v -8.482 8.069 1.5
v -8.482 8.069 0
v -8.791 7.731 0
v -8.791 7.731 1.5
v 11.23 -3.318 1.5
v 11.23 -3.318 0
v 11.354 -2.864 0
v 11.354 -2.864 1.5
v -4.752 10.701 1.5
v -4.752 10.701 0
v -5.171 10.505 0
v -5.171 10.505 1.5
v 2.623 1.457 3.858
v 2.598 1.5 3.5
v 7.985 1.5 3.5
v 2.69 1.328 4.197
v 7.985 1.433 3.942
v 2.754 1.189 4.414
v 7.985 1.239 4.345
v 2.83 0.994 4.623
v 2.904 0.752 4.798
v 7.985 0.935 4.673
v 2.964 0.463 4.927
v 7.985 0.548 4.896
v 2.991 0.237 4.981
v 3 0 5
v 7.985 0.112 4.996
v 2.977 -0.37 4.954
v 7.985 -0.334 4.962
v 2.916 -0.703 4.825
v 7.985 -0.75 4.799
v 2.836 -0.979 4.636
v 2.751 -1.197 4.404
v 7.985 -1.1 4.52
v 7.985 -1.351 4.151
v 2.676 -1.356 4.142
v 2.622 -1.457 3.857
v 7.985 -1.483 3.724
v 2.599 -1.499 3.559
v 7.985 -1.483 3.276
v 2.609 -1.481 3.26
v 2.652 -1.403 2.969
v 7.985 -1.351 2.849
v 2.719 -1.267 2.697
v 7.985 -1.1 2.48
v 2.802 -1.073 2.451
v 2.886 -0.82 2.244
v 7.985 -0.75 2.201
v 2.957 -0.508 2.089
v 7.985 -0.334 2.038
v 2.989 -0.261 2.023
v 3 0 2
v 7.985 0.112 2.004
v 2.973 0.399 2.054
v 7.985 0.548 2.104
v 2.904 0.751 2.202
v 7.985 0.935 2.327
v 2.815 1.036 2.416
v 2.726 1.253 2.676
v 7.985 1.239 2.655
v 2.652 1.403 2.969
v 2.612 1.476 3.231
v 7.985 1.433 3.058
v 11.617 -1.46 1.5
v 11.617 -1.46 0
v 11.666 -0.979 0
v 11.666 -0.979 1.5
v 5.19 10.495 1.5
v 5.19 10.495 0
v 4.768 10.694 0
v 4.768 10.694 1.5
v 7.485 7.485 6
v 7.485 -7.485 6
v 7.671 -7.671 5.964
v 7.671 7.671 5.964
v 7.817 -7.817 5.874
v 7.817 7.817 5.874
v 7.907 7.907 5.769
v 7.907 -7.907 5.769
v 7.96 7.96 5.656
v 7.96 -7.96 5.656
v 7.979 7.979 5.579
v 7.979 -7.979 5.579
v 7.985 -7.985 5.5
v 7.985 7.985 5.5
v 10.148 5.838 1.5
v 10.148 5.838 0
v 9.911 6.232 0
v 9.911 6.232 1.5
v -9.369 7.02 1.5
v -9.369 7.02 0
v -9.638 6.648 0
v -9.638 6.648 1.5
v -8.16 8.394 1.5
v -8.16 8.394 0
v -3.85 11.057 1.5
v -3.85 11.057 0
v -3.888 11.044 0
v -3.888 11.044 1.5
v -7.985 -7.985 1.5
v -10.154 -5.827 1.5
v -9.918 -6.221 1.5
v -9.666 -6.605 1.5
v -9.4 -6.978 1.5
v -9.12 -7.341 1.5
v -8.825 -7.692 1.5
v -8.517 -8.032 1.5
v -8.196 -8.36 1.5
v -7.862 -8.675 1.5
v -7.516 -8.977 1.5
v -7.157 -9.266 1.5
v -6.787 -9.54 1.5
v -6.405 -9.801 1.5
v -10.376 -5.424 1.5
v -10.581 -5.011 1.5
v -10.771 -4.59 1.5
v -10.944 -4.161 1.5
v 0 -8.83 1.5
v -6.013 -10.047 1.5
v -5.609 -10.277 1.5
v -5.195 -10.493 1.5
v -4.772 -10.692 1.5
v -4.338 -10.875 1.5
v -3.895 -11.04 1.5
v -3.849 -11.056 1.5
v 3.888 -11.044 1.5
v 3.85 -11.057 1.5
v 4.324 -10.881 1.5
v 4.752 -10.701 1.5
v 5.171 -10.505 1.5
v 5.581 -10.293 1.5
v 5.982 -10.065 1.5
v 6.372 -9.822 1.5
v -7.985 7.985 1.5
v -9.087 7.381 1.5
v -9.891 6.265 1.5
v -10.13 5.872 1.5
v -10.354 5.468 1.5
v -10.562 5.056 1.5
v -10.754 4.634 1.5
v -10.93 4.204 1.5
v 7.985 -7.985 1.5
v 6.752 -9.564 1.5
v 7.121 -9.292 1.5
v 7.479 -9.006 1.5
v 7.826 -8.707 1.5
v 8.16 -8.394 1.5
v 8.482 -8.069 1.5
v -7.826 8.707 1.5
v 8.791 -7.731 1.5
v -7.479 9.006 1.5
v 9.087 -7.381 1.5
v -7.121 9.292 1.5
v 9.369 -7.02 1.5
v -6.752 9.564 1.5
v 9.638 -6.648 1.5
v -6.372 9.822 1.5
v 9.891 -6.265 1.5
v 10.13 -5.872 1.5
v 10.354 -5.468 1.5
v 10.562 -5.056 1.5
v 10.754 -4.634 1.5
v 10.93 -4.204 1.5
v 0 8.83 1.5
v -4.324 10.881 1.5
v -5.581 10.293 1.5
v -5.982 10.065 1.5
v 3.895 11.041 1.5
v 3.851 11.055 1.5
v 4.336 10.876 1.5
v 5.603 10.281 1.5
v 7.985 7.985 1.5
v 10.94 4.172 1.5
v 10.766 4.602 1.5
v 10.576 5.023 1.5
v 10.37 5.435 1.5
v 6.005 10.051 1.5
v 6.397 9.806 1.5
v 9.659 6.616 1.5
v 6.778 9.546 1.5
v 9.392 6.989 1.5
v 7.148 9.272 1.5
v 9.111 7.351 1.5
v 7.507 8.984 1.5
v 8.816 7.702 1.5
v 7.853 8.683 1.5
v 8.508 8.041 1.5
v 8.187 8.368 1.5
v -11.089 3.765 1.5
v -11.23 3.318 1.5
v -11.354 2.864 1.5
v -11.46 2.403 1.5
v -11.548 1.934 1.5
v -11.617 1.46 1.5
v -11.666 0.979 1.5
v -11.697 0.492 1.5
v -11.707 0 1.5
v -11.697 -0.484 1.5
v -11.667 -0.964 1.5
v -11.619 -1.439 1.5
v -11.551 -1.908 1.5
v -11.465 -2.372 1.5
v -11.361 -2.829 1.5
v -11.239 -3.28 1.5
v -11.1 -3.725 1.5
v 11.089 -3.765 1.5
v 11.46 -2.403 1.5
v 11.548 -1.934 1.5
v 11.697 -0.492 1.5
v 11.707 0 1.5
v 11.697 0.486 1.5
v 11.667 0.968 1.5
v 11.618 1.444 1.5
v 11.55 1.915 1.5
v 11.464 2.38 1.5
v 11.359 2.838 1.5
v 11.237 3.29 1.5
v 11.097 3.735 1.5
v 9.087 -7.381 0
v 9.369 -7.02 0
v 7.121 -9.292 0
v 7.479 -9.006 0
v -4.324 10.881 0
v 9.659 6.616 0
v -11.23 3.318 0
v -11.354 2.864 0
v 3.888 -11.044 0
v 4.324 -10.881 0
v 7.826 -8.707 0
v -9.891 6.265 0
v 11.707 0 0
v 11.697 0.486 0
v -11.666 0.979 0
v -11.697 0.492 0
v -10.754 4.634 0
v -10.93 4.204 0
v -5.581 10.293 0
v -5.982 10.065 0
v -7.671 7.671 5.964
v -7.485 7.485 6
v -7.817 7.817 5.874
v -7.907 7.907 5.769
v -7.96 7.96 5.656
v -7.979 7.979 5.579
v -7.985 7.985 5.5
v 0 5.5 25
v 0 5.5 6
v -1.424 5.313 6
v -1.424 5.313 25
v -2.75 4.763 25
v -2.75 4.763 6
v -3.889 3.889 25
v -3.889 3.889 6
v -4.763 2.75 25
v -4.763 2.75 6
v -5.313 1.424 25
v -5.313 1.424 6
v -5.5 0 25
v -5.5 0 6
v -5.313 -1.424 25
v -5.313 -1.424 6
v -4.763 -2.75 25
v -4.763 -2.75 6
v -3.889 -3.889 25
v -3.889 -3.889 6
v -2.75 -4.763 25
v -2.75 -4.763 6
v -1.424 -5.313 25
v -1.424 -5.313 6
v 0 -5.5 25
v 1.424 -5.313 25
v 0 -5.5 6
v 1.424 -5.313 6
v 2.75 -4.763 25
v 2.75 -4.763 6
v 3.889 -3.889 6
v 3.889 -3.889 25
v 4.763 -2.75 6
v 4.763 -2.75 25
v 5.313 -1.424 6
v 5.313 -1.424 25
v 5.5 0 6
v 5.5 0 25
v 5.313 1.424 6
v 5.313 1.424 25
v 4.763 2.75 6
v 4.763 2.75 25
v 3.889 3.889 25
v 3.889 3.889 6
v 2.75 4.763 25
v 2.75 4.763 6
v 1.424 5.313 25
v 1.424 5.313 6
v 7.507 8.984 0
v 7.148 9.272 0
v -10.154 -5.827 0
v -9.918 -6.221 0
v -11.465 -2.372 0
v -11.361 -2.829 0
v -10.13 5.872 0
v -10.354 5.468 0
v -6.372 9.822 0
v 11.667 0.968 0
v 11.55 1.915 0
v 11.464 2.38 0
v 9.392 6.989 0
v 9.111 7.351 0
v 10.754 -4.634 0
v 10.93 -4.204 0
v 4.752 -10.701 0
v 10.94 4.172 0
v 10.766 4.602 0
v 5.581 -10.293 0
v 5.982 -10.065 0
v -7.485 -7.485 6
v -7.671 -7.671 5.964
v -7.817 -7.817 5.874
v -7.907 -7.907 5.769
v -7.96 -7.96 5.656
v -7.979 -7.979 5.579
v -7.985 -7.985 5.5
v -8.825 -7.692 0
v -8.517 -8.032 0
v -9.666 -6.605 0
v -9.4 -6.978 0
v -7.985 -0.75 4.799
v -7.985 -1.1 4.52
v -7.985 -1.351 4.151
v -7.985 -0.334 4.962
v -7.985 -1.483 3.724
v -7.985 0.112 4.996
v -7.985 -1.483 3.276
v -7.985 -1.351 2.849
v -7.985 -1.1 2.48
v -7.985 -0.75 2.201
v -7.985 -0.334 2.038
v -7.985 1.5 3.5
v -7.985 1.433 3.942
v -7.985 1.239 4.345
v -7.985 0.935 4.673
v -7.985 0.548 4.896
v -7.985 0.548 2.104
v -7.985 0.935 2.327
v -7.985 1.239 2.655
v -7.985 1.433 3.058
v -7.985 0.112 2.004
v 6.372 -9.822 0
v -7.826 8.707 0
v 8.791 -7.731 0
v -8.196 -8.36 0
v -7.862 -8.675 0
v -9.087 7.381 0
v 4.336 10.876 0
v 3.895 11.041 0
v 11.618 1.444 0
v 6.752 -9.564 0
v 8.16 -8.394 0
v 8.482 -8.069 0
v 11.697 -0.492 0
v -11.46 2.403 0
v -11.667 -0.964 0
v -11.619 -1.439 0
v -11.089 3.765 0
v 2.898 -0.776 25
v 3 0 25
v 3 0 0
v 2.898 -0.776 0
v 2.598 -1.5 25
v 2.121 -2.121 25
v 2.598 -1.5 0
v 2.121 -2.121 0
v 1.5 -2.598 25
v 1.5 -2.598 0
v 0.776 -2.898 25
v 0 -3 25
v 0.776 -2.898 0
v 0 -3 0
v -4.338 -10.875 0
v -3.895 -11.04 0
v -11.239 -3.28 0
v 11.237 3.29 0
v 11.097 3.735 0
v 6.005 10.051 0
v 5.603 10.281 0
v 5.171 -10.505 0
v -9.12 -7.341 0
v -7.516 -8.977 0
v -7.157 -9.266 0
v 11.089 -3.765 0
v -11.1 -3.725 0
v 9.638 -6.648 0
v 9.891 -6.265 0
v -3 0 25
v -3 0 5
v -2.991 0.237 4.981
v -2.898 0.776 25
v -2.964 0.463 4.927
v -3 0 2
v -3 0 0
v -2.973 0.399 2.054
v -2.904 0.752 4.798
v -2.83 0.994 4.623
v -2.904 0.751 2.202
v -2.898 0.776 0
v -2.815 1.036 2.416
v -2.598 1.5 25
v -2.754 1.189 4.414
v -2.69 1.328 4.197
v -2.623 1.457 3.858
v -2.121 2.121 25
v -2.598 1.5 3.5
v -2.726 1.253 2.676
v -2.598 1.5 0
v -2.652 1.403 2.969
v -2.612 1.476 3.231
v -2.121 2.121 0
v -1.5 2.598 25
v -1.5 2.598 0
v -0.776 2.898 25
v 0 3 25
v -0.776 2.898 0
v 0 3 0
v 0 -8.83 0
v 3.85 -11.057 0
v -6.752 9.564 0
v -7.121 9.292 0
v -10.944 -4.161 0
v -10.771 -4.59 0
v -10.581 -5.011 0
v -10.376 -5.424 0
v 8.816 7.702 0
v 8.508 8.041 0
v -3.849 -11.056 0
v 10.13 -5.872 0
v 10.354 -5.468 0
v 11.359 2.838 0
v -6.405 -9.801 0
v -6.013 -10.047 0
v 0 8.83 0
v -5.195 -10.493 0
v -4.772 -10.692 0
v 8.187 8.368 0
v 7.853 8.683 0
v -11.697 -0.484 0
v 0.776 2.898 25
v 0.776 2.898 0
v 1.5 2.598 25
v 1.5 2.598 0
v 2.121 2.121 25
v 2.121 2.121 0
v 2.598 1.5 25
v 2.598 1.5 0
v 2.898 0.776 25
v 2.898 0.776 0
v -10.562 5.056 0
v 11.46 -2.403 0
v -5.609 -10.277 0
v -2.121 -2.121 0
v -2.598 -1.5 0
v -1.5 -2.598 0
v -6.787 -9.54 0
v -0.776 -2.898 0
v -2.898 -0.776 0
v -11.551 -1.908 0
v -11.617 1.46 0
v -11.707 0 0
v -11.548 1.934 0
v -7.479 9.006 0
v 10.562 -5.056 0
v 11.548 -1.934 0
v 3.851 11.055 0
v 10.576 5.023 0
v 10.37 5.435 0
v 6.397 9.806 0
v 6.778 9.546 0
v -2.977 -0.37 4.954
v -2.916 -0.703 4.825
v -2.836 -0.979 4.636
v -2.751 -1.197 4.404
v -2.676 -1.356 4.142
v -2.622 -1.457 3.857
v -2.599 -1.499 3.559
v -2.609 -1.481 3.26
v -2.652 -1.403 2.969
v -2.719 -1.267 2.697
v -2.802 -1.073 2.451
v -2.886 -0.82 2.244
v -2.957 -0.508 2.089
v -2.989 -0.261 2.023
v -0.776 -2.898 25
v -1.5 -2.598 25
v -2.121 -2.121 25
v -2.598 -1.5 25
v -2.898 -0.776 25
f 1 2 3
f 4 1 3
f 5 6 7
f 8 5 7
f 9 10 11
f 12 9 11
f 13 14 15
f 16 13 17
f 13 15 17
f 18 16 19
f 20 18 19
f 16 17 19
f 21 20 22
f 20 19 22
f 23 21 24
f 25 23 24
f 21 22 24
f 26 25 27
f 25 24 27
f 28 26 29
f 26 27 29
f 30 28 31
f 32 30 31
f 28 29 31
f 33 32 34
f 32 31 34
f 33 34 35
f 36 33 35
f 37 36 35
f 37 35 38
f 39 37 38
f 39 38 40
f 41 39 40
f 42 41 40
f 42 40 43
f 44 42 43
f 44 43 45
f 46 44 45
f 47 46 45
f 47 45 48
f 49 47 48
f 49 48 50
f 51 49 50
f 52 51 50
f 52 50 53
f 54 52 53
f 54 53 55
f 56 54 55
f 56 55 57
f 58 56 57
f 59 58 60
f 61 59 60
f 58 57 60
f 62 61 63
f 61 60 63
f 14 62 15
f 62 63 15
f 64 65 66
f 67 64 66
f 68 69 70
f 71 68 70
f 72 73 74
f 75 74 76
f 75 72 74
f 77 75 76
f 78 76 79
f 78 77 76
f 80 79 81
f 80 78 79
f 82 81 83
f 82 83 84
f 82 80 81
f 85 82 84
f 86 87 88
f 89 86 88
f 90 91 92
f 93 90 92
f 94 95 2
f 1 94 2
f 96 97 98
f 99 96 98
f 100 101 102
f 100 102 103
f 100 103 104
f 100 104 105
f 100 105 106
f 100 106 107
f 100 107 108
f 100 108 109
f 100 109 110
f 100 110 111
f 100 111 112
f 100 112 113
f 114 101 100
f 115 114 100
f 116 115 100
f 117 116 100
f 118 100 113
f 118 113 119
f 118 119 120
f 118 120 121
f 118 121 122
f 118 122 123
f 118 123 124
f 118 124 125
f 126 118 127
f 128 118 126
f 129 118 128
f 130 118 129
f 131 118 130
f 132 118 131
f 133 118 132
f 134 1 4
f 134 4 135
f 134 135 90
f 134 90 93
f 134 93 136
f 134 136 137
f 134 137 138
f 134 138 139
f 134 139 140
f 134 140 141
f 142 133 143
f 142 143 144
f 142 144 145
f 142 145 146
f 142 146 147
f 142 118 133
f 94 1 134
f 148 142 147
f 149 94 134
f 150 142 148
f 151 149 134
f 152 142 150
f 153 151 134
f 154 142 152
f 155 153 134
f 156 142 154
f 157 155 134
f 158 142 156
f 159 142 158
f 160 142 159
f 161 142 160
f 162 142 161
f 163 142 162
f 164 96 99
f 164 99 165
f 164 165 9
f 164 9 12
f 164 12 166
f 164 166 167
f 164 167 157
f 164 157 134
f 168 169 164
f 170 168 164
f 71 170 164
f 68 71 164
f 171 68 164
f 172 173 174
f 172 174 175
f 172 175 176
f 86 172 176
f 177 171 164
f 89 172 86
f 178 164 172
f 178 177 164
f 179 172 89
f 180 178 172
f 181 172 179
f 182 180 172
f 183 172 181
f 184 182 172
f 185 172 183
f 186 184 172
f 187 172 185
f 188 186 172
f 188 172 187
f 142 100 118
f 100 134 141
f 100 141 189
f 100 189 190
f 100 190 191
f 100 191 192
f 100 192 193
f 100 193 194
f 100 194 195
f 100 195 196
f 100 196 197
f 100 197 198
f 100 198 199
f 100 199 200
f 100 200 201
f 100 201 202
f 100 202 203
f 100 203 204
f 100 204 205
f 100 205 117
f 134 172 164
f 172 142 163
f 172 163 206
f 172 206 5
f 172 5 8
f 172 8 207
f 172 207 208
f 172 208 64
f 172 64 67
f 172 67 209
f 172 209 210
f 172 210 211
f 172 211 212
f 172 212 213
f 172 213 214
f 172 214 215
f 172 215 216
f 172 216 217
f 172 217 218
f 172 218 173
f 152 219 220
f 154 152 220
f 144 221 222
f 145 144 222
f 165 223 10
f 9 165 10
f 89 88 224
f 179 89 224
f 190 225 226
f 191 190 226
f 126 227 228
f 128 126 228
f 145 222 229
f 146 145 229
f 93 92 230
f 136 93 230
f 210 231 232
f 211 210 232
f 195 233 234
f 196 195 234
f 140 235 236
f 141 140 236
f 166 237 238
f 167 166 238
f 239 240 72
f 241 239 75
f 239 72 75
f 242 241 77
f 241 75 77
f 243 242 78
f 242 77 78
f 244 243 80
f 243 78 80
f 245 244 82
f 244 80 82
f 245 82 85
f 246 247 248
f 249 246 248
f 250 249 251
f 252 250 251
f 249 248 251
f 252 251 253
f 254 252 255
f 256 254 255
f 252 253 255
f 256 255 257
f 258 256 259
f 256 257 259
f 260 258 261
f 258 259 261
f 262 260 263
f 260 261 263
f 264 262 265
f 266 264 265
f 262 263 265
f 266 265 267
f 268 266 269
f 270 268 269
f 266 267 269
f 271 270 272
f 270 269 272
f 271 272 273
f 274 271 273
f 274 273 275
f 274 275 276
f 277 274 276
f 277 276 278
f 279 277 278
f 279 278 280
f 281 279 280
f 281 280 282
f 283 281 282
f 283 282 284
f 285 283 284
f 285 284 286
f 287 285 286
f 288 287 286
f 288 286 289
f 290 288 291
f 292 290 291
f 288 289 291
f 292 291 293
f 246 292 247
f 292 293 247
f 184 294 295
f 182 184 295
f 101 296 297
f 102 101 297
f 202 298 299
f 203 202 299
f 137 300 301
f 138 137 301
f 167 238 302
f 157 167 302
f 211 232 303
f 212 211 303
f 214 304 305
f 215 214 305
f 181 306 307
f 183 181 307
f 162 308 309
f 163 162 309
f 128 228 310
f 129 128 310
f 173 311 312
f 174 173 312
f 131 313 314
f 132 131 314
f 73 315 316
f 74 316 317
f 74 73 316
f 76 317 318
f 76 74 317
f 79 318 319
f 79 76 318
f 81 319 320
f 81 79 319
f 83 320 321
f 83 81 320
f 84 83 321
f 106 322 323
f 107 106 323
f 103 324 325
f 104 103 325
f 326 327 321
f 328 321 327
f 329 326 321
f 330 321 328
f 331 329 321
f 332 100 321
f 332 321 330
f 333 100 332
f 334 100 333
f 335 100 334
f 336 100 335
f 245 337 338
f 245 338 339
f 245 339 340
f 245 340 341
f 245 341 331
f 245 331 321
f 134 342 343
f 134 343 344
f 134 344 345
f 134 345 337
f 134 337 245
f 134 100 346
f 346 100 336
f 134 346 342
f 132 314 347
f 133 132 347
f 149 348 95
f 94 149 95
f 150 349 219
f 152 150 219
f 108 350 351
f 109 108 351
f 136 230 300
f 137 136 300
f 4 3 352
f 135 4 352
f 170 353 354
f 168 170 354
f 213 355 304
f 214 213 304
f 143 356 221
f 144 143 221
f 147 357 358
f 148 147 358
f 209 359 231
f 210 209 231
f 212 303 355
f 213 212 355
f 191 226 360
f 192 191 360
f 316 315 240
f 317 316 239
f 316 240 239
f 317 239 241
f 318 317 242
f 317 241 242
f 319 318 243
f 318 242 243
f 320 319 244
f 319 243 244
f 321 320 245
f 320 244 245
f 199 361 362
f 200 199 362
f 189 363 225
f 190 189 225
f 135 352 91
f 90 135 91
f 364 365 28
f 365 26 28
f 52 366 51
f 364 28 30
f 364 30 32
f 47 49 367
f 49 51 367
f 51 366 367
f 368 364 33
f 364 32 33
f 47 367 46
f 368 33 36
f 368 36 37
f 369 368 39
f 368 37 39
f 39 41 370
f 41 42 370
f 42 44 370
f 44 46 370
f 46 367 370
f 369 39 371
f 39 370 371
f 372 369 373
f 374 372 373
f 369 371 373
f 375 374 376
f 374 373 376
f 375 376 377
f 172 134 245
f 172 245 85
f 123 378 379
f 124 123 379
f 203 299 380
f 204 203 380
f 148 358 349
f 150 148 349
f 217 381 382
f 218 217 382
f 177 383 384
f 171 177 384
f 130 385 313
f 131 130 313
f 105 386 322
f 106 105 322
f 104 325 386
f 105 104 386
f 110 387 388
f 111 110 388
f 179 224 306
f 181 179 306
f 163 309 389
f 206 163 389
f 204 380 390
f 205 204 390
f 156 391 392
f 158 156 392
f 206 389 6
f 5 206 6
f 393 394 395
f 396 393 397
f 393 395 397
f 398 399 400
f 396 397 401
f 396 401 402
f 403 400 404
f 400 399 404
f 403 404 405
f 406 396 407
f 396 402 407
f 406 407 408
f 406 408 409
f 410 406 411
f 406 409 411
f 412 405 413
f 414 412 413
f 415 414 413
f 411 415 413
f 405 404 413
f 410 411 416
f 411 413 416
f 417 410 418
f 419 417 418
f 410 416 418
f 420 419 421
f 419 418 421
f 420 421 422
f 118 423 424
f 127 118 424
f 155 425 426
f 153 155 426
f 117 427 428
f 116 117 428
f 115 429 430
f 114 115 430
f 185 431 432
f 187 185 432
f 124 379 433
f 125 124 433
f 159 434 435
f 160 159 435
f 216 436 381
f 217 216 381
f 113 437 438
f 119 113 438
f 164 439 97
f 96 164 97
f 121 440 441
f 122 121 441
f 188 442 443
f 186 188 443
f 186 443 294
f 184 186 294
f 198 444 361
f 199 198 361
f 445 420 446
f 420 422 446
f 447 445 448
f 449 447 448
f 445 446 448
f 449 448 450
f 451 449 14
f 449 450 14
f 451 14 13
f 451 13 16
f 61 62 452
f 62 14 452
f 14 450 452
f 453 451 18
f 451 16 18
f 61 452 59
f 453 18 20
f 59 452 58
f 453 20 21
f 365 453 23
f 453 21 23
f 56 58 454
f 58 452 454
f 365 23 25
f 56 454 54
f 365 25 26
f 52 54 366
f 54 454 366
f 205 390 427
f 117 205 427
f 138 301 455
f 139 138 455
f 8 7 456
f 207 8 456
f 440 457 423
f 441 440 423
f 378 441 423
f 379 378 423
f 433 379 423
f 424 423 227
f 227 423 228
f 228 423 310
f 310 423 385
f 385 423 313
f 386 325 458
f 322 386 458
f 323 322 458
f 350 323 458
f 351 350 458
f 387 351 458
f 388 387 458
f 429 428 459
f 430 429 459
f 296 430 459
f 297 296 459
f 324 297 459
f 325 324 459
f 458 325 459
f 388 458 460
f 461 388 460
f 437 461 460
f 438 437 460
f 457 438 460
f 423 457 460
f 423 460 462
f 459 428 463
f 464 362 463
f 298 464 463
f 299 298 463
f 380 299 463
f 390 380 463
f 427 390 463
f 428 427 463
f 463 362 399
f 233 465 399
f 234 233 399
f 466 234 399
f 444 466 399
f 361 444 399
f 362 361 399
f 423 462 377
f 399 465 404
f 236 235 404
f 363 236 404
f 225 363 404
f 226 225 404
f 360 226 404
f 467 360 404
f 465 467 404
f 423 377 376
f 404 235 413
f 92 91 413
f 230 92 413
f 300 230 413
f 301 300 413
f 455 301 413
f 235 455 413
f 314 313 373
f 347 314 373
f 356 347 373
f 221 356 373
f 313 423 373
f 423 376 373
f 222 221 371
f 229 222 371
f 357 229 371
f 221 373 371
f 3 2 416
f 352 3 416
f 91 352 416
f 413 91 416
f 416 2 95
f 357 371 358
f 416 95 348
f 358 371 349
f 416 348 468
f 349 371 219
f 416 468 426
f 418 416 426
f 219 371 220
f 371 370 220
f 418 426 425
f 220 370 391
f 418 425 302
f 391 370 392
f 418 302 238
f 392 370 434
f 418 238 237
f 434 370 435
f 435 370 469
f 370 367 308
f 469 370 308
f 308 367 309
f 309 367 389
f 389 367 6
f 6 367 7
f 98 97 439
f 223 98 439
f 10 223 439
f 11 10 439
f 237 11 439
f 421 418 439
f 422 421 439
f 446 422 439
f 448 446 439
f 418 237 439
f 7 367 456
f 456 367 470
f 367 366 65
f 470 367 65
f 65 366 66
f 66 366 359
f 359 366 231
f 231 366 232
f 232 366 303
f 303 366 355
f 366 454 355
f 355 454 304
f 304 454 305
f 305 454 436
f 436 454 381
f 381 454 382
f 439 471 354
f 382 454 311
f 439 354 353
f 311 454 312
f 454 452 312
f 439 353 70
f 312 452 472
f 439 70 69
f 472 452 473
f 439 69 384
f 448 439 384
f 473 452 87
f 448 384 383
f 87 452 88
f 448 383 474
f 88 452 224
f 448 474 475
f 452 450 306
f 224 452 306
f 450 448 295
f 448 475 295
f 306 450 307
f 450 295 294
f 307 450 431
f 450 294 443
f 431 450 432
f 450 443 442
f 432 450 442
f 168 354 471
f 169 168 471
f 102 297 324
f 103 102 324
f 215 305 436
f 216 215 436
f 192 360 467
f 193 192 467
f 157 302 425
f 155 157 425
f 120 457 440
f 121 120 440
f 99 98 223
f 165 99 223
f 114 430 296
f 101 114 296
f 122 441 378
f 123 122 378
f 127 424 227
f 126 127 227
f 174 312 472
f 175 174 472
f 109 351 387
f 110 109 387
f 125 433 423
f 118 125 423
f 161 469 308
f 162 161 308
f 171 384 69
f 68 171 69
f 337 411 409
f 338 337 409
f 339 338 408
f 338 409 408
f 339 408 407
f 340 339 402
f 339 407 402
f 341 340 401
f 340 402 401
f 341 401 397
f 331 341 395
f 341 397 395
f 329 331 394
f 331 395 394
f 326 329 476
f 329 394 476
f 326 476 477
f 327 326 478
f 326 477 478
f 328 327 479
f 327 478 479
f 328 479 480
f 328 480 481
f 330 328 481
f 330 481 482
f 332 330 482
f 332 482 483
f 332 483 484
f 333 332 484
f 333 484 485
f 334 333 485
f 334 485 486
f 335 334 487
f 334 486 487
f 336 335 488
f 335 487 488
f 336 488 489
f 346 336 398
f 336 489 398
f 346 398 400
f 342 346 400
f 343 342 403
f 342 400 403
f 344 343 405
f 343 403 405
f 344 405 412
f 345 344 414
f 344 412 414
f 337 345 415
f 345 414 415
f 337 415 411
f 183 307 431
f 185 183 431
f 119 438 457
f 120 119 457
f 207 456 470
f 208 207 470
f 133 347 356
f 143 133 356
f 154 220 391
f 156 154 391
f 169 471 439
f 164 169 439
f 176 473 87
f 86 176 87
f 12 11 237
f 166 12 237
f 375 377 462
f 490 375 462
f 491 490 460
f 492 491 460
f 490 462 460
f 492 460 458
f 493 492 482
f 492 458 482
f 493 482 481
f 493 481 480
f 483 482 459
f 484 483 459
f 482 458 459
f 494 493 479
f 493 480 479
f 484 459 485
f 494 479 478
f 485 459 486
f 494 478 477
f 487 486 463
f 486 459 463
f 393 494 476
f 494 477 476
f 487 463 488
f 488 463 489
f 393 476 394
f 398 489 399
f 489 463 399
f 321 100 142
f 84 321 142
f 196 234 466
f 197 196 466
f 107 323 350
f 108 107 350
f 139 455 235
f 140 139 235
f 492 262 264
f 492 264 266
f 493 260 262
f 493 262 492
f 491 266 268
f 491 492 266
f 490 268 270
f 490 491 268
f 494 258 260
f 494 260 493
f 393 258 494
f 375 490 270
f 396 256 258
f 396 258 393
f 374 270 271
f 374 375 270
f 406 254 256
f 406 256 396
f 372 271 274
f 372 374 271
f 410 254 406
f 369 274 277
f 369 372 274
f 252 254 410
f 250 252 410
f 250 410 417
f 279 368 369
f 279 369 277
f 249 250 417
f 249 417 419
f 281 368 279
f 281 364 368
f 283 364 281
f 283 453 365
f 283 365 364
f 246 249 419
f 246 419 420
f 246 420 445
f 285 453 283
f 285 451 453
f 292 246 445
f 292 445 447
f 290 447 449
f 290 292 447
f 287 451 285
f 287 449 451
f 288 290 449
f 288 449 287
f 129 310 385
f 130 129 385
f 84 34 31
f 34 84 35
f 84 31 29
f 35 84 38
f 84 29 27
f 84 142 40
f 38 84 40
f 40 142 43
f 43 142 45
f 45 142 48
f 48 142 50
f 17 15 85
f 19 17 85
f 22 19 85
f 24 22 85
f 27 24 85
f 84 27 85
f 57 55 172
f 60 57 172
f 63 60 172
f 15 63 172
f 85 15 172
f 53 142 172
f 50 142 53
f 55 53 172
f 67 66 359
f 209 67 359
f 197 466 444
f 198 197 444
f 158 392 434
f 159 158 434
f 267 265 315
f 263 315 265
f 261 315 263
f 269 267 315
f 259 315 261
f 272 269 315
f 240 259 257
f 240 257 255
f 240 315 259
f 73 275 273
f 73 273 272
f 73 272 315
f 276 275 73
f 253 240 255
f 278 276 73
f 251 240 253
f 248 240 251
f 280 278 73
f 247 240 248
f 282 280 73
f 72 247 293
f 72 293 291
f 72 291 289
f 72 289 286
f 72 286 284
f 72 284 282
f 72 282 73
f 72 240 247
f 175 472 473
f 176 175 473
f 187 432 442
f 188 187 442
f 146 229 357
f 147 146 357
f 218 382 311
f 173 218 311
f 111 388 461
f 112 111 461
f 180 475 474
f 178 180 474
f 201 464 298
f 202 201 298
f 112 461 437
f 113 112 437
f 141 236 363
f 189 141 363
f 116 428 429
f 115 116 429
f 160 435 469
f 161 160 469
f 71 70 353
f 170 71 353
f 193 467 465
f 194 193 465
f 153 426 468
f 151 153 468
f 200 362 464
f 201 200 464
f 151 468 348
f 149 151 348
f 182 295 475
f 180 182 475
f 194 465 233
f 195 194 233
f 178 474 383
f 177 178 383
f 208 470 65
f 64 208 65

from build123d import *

# Parameters (mm, degrees)
F0_W     = 15.97
F0_H     = 15.97
F1_DEPTH = 1.5
F2_DEPTH = 6
F3_DEPTH = 14
F4_R     = 0.5
F5_DEPTH = 25
F7_D     = 3


# Not quite as in the source:
# - after a boolean that leaves OpenCascade's solid faulty, fix() repairs it


with BuildPart() as f1:
    # F0 (on Top) → F1 (new body)
    with BuildSketch(Plane.XY):
        Polygon((11.463976, 2.379747), (11.359373, 2.838321), (11.236939, 3.290208), (11.097035, 3.735011), (10.940019, 4.172325), (10.766249, 4.60174), (10.576084, 5.022839), (10.369884, 5.435203), (10.148011, 5.838407), (9.910829, 6.232024), (9.658704, 6.615624), (9.392003, 6.988776), (9.111097, 7.351047), (8.816357, 7.702006), (8.508156, 8.04122), (8.186868, 8.368258), (7.852869, 8.68269), (7.506532, 8.98409), (7.148231, 9.272031), (6.778339, 9.546091), (6.397225, 9.805849), (6.005257, 10.050886), (5.602798, 10.280786), (5.190206, 10.495134), (4.767834, 10.693518), (4.336029, 10.875525), (3.895133, 11.040743), (3.851403, 11.055137), (-0.000321, 8.82993), (-3.850041, 11.056837), (-3.888073, 11.04433), (-4.324324, 10.88112), (-4.752184, 10.701192), (-5.171268, 10.504934), (-5.581182, 10.292736), (-5.98153, 10.06499), (-6.371909, 9.822089), (-6.751914, 9.564429), (-7.121137, 9.292409), (-7.47917, 9.00643), (-7.825602, 8.706896), (-8.160021, 8.394212), (-8.482018, 8.068787), (-8.791184, 7.73103), (-9.087111, 7.38135), (-9.369393, 7.020158), (-9.637626, 6.647865), (-9.89141, 6.26488), (-10.130347, 5.871608), (-10.354039, 5.468455), (-10.562095, 5.055822), (-10.754123, 4.634103), (-10.929732, 4.203692), (-11.088533, 3.764972), (-11.230138, 3.318323), (-11.354158, 2.864116), (-11.4602, 2.402716), (-11.54787, 1.934479), (-11.616771, 1.459754), (-11.666499, 0.978883), (-11.696643, 0.4922), (-11.706789, -8e-05), (-11.696889, -0.484214), (-11.667434, -0.963844), (-11.618789, -1.43855), (-11.551313, -1.907948), (-11.465359, -2.371647), (-11.36128, -2.829248), (-11.239422, -3.280348), (-11.100133, -3.724535), (-10.943759, -4.161393), (-10.770647, -4.590499), (-10.581144, -5.011426), (-10.375599, -5.423743), (-10.154362, -5.827016), (-9.917785, -6.220806), (-9.666223, -6.604675), (-9.400031, -6.978182), (-9.119567, -7.340886), (-8.825191, -7.692347), (-8.517263, -8.032124), (-8.196144, -8.359779), (-7.862195, -8.674874), (-7.515776, -8.976975), (-7.157247, -9.265648), (-6.786965, -9.540464), (-6.405285, -9.800995), (-6.012557, -10.046813), (-5.609128, -10.277496), (-5.195341, -10.492621), (-4.771529, -10.691767), (-4.338024, -10.874511), (-3.895147, -11.040433), (-3.849233, -11.055538), (0.000108, -8.829807), (3.850042, -11.056838), (3.888074, -11.04433), (4.324324, -10.881121), (4.752185, -10.701192), (5.171269, -10.504935), (5.581183, -10.292737), (5.98153, -10.064991), (6.371909, -9.822089), (6.751914, -9.56443), (7.121138, -9.29241), (7.479171, -9.006431), (7.825602, -8.706896), (8.160022, -8.394213), (8.482019, -8.068788), (8.791185, -7.73103), (9.087111, -7.38135), (9.369393, -7.020159), (9.637626, -6.647866), (9.891411, -6.26488), (10.130347, -5.871609), (10.35404, -5.468456), (10.562096, -5.055822), (10.754123, -4.634104), (10.929732, -4.203692), (11.088534, -3.764973), (11.230139, -3.318324), (11.354158, -2.864117), (11.4602, -2.402716), (11.547871, -1.934479), (11.616772, -1.459754), (11.666499, -0.978883), (11.696644, -0.492201), (11.706789, 5.7e-05), (11.696823, 0.486311), (11.667183, 0.967786), (11.618247, 1.444099), (11.550389, 1.914878), align=None)
        Rectangle(F0_W, F0_H, mode=Mode.SUBTRACT)
    extrude(amount=F1_DEPTH)

    # F0 (on Top) → F2 (join)
    with BuildSketch(Plane.XY):
        Rectangle(F0_W, F0_H)
        with BuildLine():
            ThreePointArc((-5.5, 0), (-3.8890872965, 3.8890872965), (0, 5.5))
            ThreePointArc((0, 5.5), (3.8890872965, 3.8890872965), (5.5, 0))
            ThreePointArc((5.5, 0), (3.8890872965, -3.8890872965), (0, -5.5))
            ThreePointArc((0, -5.5), (-3.8890872965, -3.8890872965), (-5.5, 0))
        make_face(mode=Mode.SUBTRACT)
    extrude(amount=F2_DEPTH)

    # F0 (on Top) → F3 (join)
    with BuildSketch(Plane.XY):
        with BuildLine():
            ThreePointArc((5.5, 0), (3.8890872965, 3.8890872965), (0, 5.5))
            ThreePointArc((0, 5.5), (-3.8890872965, 3.8890872965), (-5.5, 0))
            ThreePointArc((-5.5, 0), (-3.8890872965, -3.8890872965), (0, -5.5))
            ThreePointArc((0, -5.5), (3.8890872965, -3.8890872965), (5.5, 0))
        make_face()
        with BuildLine():
            ThreePointArc((-3, 0), (-2.1213203436, 2.1213203436), (0, 3))
            ThreePointArc((0, 3), (2.1213203436, 2.1213203436), (3, 0))
            ThreePointArc((3, 0), (2.1213203436, -2.1213203436), (0, -3))
            ThreePointArc((0, -3), (-2.1213203436, -2.1213203436), (-3, 0))
        make_face(mode=Mode.SUBTRACT)
    extrude(amount=F3_DEPTH)

    # F4
    f4_edges = [f1.edges().sort_by_distance(p)[0] for p in [
        (-7.985, 0, 6),
        (0, -7.985, 6),
        (7.985, 0, 6),
        (0, 7.985, 6),
    ]]
    fillet(f4_edges, radius=F4_R)

    # F0 (on Top) → F5 (join)
    with BuildSketch(Plane.XY):
        with BuildLine():
            ThreePointArc((5.5, 0), (3.8890872965, 3.8890872965), (0, 5.5))
            ThreePointArc((0, 5.5), (-3.8890872965, 3.8890872965), (-5.5, 0))
            ThreePointArc((-5.5, 0), (-3.8890872965, -3.8890872965), (0, -5.5))
            ThreePointArc((0, -5.5), (3.8890872965, -3.8890872965), (5.5, 0))
        make_face()
        with BuildLine():
            ThreePointArc((-3, 0), (-2.1213203436, 2.1213203436), (0, 3))
            ThreePointArc((0, 3), (2.1213203436, 2.1213203436), (3, 0))
            ThreePointArc((3, 0), (2.1213203436, -2.1213203436), (0, -3))
            ThreePointArc((0, -3), (-2.1213203436, -2.1213203436), (-3, 0))
        make_face(mode=Mode.SUBTRACT)
    extrude(amount=F5_DEPTH)

    # F7 (through all)
    with Locations(Plane(origin=(-7.985, 0, 0), x_dir=(0, -1, 0), z_dir=(-1, 0, 0))):
        with Locations((0, 3.5)):
            Hole(F7_D / 2)

    add(f1.part.fix(), mode=Mode.REPLACE)


solid = f1.part
